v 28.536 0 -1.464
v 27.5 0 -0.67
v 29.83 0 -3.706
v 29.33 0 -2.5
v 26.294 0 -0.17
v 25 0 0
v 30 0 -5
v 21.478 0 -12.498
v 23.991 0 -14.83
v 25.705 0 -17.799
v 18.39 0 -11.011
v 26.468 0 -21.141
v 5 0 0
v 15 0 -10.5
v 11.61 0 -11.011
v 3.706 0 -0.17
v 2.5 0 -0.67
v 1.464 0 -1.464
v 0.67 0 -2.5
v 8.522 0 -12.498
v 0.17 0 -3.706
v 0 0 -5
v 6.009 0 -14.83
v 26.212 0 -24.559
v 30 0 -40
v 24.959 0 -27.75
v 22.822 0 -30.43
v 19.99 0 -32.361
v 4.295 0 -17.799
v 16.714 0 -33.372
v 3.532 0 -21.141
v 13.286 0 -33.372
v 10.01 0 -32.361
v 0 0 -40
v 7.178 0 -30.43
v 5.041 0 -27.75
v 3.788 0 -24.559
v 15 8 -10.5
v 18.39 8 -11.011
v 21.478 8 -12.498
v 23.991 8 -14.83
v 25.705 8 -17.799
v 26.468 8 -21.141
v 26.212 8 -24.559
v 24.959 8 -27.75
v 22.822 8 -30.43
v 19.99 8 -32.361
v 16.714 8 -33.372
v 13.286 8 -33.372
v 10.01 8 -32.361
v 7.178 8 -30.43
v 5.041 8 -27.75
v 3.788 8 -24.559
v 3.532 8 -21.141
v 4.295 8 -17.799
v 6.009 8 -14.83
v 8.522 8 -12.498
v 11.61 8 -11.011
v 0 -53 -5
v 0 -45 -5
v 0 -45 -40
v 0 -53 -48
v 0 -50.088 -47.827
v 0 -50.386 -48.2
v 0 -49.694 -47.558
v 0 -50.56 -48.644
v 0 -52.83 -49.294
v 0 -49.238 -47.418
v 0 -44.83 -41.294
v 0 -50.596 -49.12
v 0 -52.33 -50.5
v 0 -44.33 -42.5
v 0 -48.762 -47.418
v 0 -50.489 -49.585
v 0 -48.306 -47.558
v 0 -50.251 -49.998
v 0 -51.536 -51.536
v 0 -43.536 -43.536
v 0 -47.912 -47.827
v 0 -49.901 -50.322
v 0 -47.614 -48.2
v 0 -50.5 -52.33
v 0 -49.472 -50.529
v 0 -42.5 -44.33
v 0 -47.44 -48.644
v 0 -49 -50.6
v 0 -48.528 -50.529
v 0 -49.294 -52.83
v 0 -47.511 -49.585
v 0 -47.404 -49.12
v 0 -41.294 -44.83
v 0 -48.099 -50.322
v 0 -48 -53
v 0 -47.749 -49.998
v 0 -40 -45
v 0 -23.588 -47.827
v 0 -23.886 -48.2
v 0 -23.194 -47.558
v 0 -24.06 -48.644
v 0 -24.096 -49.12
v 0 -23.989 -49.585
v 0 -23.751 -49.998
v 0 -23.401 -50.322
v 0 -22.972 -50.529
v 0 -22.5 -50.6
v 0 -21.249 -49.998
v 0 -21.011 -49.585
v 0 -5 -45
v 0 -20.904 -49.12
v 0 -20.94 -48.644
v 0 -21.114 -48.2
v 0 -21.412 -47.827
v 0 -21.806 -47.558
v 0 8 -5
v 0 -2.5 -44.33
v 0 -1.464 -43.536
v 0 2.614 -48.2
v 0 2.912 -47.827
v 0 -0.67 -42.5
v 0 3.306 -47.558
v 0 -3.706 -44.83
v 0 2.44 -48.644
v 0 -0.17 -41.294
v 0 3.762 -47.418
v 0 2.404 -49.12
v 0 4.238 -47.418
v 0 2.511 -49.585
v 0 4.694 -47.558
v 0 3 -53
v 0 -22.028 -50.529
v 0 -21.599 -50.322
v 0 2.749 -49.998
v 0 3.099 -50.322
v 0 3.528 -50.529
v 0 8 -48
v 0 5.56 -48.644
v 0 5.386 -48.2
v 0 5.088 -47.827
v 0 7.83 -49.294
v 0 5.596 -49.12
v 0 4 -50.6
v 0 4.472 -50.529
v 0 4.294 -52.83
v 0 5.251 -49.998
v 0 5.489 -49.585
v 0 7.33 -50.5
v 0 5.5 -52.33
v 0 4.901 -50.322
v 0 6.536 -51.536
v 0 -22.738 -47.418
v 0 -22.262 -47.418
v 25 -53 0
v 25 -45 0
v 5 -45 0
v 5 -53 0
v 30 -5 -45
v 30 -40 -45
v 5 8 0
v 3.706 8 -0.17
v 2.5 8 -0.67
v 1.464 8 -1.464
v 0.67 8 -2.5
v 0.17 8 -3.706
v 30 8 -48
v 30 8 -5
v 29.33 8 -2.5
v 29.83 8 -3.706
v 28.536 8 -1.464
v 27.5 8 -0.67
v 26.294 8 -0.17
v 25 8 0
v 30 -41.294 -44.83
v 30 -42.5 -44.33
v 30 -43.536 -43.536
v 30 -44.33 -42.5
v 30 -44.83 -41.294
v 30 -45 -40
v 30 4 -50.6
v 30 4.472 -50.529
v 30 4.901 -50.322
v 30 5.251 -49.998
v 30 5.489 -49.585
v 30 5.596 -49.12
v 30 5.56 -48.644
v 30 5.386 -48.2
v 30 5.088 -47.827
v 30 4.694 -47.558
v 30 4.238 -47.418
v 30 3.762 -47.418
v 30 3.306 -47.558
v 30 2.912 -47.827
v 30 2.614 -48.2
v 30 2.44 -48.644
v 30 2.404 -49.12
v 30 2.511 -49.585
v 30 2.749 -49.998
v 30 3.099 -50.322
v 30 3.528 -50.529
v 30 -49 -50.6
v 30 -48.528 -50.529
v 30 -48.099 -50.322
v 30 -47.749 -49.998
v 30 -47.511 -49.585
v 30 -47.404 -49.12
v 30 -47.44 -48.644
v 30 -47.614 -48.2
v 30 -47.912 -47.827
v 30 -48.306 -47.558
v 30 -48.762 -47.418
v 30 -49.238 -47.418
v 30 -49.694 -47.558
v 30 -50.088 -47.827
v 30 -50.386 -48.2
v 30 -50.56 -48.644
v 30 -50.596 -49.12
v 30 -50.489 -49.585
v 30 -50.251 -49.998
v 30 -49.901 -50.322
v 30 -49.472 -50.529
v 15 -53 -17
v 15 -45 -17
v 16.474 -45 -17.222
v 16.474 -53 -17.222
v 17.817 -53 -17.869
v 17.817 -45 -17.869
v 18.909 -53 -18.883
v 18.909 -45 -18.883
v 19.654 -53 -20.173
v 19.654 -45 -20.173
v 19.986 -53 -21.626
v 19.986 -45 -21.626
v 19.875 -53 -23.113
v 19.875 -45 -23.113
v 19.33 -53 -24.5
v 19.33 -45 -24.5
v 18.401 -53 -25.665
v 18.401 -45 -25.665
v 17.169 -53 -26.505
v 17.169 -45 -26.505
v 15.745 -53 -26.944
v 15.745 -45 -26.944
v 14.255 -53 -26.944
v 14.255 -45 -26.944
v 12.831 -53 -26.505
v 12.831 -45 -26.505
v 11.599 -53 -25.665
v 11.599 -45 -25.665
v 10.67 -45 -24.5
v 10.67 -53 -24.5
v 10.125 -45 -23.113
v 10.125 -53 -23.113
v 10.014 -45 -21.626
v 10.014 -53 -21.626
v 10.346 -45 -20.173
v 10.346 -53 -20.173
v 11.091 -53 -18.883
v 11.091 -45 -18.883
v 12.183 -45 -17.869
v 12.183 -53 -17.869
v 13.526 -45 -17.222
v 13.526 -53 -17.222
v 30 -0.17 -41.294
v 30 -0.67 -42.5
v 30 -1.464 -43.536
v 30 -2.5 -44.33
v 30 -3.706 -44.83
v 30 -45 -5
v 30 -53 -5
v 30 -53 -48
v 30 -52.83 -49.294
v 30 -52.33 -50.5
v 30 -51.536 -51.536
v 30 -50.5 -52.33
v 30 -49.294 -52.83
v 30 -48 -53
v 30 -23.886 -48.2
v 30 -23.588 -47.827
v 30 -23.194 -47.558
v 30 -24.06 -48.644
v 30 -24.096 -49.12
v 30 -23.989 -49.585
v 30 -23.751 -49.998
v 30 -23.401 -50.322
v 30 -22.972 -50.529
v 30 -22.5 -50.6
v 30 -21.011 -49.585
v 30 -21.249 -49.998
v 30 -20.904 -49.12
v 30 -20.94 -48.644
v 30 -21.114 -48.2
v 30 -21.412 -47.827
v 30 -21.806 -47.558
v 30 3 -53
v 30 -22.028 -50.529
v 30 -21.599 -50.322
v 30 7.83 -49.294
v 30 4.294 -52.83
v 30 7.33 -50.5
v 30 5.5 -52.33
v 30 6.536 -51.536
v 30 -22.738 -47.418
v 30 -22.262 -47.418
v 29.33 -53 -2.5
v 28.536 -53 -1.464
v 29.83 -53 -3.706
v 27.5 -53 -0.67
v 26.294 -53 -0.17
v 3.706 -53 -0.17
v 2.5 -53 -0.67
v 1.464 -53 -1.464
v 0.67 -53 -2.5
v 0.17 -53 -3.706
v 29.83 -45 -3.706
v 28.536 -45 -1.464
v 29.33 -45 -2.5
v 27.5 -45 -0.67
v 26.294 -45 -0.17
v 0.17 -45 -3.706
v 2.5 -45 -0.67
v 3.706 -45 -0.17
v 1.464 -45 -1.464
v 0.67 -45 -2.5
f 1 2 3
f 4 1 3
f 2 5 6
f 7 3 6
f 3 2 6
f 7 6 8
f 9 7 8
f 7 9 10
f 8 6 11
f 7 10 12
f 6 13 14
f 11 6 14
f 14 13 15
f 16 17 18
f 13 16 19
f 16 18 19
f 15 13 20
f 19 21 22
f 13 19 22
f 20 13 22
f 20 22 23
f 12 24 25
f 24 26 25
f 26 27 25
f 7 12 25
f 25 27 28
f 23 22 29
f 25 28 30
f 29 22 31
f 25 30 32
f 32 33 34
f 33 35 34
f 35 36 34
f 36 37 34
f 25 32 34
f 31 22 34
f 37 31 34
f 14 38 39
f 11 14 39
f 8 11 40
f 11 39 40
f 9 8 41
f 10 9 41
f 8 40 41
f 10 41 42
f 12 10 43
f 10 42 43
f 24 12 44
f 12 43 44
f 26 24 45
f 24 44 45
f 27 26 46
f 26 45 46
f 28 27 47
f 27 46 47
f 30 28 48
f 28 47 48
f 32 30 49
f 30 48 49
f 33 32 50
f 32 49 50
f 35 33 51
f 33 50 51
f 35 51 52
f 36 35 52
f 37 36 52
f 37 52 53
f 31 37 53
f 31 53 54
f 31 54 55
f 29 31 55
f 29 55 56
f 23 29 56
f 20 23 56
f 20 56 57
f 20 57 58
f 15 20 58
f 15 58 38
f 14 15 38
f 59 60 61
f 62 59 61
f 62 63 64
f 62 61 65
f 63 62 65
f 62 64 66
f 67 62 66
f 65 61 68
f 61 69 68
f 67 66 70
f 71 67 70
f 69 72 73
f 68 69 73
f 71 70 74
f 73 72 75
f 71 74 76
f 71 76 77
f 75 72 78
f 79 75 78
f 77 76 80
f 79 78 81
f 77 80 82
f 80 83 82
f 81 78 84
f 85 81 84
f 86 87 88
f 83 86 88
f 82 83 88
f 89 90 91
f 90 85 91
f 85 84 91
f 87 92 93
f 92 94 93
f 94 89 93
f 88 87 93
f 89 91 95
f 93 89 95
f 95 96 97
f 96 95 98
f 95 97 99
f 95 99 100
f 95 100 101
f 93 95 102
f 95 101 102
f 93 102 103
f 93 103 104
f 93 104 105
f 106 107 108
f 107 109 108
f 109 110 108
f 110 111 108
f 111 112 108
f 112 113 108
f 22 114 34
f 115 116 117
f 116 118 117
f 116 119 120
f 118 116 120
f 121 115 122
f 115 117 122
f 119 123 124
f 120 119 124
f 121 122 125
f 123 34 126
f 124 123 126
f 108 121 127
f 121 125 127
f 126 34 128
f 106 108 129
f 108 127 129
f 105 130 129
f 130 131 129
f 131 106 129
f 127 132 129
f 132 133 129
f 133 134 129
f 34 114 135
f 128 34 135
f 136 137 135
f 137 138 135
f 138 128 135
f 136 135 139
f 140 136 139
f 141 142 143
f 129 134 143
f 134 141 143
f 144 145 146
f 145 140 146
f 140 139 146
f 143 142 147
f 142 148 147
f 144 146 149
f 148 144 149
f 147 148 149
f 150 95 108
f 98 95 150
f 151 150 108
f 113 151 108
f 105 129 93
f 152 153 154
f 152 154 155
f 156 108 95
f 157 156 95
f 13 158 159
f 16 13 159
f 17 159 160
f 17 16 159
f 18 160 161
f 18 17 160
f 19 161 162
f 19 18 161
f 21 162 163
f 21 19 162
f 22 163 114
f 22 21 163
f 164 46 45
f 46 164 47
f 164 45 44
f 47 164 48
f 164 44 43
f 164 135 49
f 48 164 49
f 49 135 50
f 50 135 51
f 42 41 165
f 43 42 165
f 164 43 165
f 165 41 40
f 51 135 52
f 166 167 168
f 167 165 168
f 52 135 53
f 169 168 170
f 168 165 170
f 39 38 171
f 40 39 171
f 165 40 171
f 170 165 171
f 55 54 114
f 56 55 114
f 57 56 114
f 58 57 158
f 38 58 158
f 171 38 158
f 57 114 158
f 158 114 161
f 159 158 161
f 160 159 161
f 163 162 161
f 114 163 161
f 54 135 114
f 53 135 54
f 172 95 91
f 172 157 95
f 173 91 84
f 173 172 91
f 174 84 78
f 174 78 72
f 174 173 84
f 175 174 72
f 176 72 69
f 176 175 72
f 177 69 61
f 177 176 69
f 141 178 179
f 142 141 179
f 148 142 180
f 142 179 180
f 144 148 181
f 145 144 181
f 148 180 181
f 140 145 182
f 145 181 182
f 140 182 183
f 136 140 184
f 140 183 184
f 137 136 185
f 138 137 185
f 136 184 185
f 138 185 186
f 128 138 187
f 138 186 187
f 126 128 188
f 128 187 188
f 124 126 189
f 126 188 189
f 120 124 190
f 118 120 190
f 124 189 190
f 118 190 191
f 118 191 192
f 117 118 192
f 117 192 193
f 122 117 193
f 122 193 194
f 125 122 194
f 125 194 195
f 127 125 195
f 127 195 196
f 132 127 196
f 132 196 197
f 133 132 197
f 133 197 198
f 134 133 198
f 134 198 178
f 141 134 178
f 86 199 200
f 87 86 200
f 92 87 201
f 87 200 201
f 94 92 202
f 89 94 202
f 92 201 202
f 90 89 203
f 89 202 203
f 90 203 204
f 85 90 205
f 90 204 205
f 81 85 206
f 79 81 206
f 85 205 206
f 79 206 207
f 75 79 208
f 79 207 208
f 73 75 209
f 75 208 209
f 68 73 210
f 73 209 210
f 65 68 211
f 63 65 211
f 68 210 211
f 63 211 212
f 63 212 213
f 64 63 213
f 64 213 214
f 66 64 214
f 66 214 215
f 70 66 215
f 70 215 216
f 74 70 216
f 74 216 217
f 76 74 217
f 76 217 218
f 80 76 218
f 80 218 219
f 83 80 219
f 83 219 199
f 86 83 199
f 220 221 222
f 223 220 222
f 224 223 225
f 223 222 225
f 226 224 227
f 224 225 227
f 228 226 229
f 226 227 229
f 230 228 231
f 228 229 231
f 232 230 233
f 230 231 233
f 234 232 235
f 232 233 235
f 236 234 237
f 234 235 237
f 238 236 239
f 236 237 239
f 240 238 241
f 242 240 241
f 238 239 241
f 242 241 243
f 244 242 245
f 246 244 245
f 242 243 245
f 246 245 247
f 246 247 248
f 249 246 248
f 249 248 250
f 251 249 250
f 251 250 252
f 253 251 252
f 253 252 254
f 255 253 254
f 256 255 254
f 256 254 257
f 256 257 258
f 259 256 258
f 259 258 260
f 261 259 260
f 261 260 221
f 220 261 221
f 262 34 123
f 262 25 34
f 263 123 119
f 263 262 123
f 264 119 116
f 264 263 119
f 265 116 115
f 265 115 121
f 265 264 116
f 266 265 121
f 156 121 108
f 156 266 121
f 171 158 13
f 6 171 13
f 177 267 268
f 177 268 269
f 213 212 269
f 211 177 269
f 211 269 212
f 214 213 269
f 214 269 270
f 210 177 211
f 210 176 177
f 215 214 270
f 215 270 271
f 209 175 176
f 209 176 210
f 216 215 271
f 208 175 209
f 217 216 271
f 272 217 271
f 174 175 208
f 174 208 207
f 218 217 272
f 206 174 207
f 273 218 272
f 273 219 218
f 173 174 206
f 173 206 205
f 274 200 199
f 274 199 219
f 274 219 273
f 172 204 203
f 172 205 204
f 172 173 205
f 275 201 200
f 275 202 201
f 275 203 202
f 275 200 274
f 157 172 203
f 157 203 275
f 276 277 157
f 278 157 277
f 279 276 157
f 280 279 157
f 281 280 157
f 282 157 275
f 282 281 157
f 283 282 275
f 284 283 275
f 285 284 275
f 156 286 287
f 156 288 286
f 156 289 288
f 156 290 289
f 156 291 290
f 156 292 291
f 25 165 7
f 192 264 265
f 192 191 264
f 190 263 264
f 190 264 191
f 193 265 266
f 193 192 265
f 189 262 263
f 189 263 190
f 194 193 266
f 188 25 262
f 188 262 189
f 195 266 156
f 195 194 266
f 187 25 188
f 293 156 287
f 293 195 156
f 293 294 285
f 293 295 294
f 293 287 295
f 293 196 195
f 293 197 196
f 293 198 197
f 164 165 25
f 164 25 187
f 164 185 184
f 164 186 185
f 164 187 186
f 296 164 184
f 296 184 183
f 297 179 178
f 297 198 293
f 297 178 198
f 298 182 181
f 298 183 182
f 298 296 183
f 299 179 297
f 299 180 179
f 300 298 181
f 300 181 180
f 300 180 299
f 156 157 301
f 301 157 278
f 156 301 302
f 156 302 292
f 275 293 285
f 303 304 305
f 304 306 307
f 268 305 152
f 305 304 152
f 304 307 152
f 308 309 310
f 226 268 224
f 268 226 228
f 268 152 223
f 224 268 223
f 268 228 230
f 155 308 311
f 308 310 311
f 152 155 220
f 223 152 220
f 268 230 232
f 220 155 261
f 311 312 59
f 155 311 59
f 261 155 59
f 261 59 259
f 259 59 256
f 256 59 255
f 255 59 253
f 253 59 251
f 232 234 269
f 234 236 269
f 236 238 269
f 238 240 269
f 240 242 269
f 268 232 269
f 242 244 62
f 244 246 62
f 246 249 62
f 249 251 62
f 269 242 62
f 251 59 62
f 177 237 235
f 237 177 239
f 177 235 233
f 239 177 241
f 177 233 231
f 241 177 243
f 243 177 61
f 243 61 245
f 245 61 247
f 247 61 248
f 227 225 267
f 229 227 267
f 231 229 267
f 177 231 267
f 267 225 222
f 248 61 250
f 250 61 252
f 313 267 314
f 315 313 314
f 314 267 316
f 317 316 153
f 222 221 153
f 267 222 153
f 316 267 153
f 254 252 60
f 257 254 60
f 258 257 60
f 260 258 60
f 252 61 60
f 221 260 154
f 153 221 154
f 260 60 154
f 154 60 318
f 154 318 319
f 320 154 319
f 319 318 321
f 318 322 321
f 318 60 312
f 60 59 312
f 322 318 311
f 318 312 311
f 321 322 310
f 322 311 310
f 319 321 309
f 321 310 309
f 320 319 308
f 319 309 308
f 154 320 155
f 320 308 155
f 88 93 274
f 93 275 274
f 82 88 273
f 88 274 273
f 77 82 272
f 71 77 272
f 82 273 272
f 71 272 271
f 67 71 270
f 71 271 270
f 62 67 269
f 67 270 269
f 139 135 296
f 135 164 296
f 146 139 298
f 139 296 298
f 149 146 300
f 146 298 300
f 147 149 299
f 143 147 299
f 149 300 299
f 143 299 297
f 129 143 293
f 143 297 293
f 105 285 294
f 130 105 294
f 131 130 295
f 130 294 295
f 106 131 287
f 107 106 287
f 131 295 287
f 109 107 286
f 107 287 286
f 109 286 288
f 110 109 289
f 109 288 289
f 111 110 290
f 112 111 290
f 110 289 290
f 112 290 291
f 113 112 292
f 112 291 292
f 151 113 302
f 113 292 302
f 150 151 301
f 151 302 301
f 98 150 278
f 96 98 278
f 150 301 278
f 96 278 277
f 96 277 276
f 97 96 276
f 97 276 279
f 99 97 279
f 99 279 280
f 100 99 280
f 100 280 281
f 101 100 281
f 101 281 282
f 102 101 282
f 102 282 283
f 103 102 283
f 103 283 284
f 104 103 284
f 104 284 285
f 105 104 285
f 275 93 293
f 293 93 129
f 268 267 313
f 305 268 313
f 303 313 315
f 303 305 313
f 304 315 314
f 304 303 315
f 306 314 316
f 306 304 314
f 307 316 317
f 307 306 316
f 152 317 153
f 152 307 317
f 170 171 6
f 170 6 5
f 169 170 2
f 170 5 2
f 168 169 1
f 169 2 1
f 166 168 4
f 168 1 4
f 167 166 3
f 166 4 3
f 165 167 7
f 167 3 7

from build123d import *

# Parameters (mm, degrees)
BOSS_EXTRUDE1_DEPTH = 30
CUT_EXTRUDE1_REACH  = 88.197
SKETCH2_R           = 11.5
CUT_EXTRUDE2_REACH  = 82.734
SKETCH3_R           = 5
CUT_EXTRUDE3_REACH  = 82.734
SKETCH4_R           = 1.6
FILLET1_R           = 5
FILLET2_R           = 5


with BuildPart() as part:
    # Sketch1 → Boss-Extrude1 (new body)
    with BuildSketch(Plane(origin=(0, 0, 0), x_dir=(0, 0, -1), z_dir=(1, 0, 0))):
        Polygon((0, 0), (45, 0), (45, -45), (0, -45), (0, -53), (53, -53), (53, 8), (0, 8), align=None)
    extrude(amount=BOSS_EXTRUDE1_DEPTH)

    # Sketch2 → Cut-Extrude1 (cut, up to next)
    with BuildSketch(Plane(origin=(0, 8, 0), x_dir=(1, 0, 0), z_dir=(0, 1, 0)), mode=Mode.PRIVATE) as cut_extrude1_sk1:
        with Locations(Location((15, 22, 0), (0, 0, 270))):
            Circle(SKETCH2_R)
    cut_extrude1_tool1 = extrude(cut_extrude1_sk1.sketch, amount=-CUT_EXTRUDE1_REACH, mode=Mode.PRIVATE) & part.part
    add(cut_extrude1_tool1.solids().sort_by_distance((15, 8, -22))[0], mode=Mode.SUBTRACT)

    # Sketch3 → Cut-Extrude2 (cut, up to next)
    with BuildSketch(Plane(origin=(0, -45, 0), x_dir=(1, 0, 0), z_dir=(0, 1, 0)), mode=Mode.PRIVATE) as cut_extrude2_sk1:
        with Locations(Location((15, 22, 0), (0, 0, 270))):
            Circle(SKETCH3_R)
    cut_extrude2_tool1 = extrude(cut_extrude2_sk1.sketch, amount=-CUT_EXTRUDE2_REACH, mode=Mode.PRIVATE) & part.part
    add(cut_extrude2_tool1.solids().sort_by_distance((15, -45, -22))[0], mode=Mode.SUBTRACT)

    # Sketch4 → Cut-Extrude3 (cut, up to next)
    with BuildSketch(Plane(origin=(30, 0, 0), x_dir=(0, 0, -1), z_dir=(1, 0, 0)), mode=Mode.PRIVATE) as cut_extrude3_sk1:
        with Locations((49, -22.5)):
            Circle(SKETCH4_R)
    cut_extrude3_tool1 = extrude(cut_extrude3_sk1.sketch, amount=-CUT_EXTRUDE3_REACH, mode=Mode.PRIVATE) & part.part
    # Sketch4 → Cut-Extrude3 (cut, up to next)
    with BuildSketch(Plane(origin=(30, 0, 0), x_dir=(0, 0, -1), z_dir=(1, 0, 0)), mode=Mode.PRIVATE) as cut_extrude3_sk2:
        with Locations((49, -49)):
            Circle(SKETCH4_R)
    cut_extrude3_tool2 = extrude(cut_extrude3_sk2.sketch, amount=-CUT_EXTRUDE3_REACH, mode=Mode.PRIVATE) & part.part
    # Sketch4 → Cut-Extrude3 (cut, up to next)
    with BuildSketch(Plane(origin=(30, 0, 0), x_dir=(0, 0, -1), z_dir=(1, 0, 0)), mode=Mode.PRIVATE) as cut_extrude3_sk3:
        with Locations((49, 4)):
            Circle(SKETCH4_R)
    cut_extrude3_tool3 = extrude(cut_extrude3_sk3.sketch, amount=-CUT_EXTRUDE3_REACH, mode=Mode.PRIVATE) & part.part
    add(cut_extrude3_tool1.solids().sort_by_distance((30, -22.5, -49))[0], mode=Mode.SUBTRACT)
    add(cut_extrude3_tool2.solids().sort_by_distance((30, -49, -49))[0], mode=Mode.SUBTRACT)
    add(cut_extrude3_tool3.solids().sort_by_distance((30, 4, -49))[0], mode=Mode.SUBTRACT)

    # Fillet1
    fillet1_edges = [part.edges().sort_by_distance(p)[0] for p in [
        (0, 4, 0),
        (15, 8, -53),
        (15, -53, -53),
        (30, -49, 0),
        (30, 4, 0),
        (0, -49, 0),
    ]]
    fillet(fillet1_edges, radius=FILLET1_R)

    # Fillet2
    fillet2_edges = [part.edges().sort_by_distance(p)[0] for p in [
        (15, -45, -45),
        (15, 0, -45),
    ]]
    fillet(fillet2_edges, radius=FILLET2_R)


solid = part.part
